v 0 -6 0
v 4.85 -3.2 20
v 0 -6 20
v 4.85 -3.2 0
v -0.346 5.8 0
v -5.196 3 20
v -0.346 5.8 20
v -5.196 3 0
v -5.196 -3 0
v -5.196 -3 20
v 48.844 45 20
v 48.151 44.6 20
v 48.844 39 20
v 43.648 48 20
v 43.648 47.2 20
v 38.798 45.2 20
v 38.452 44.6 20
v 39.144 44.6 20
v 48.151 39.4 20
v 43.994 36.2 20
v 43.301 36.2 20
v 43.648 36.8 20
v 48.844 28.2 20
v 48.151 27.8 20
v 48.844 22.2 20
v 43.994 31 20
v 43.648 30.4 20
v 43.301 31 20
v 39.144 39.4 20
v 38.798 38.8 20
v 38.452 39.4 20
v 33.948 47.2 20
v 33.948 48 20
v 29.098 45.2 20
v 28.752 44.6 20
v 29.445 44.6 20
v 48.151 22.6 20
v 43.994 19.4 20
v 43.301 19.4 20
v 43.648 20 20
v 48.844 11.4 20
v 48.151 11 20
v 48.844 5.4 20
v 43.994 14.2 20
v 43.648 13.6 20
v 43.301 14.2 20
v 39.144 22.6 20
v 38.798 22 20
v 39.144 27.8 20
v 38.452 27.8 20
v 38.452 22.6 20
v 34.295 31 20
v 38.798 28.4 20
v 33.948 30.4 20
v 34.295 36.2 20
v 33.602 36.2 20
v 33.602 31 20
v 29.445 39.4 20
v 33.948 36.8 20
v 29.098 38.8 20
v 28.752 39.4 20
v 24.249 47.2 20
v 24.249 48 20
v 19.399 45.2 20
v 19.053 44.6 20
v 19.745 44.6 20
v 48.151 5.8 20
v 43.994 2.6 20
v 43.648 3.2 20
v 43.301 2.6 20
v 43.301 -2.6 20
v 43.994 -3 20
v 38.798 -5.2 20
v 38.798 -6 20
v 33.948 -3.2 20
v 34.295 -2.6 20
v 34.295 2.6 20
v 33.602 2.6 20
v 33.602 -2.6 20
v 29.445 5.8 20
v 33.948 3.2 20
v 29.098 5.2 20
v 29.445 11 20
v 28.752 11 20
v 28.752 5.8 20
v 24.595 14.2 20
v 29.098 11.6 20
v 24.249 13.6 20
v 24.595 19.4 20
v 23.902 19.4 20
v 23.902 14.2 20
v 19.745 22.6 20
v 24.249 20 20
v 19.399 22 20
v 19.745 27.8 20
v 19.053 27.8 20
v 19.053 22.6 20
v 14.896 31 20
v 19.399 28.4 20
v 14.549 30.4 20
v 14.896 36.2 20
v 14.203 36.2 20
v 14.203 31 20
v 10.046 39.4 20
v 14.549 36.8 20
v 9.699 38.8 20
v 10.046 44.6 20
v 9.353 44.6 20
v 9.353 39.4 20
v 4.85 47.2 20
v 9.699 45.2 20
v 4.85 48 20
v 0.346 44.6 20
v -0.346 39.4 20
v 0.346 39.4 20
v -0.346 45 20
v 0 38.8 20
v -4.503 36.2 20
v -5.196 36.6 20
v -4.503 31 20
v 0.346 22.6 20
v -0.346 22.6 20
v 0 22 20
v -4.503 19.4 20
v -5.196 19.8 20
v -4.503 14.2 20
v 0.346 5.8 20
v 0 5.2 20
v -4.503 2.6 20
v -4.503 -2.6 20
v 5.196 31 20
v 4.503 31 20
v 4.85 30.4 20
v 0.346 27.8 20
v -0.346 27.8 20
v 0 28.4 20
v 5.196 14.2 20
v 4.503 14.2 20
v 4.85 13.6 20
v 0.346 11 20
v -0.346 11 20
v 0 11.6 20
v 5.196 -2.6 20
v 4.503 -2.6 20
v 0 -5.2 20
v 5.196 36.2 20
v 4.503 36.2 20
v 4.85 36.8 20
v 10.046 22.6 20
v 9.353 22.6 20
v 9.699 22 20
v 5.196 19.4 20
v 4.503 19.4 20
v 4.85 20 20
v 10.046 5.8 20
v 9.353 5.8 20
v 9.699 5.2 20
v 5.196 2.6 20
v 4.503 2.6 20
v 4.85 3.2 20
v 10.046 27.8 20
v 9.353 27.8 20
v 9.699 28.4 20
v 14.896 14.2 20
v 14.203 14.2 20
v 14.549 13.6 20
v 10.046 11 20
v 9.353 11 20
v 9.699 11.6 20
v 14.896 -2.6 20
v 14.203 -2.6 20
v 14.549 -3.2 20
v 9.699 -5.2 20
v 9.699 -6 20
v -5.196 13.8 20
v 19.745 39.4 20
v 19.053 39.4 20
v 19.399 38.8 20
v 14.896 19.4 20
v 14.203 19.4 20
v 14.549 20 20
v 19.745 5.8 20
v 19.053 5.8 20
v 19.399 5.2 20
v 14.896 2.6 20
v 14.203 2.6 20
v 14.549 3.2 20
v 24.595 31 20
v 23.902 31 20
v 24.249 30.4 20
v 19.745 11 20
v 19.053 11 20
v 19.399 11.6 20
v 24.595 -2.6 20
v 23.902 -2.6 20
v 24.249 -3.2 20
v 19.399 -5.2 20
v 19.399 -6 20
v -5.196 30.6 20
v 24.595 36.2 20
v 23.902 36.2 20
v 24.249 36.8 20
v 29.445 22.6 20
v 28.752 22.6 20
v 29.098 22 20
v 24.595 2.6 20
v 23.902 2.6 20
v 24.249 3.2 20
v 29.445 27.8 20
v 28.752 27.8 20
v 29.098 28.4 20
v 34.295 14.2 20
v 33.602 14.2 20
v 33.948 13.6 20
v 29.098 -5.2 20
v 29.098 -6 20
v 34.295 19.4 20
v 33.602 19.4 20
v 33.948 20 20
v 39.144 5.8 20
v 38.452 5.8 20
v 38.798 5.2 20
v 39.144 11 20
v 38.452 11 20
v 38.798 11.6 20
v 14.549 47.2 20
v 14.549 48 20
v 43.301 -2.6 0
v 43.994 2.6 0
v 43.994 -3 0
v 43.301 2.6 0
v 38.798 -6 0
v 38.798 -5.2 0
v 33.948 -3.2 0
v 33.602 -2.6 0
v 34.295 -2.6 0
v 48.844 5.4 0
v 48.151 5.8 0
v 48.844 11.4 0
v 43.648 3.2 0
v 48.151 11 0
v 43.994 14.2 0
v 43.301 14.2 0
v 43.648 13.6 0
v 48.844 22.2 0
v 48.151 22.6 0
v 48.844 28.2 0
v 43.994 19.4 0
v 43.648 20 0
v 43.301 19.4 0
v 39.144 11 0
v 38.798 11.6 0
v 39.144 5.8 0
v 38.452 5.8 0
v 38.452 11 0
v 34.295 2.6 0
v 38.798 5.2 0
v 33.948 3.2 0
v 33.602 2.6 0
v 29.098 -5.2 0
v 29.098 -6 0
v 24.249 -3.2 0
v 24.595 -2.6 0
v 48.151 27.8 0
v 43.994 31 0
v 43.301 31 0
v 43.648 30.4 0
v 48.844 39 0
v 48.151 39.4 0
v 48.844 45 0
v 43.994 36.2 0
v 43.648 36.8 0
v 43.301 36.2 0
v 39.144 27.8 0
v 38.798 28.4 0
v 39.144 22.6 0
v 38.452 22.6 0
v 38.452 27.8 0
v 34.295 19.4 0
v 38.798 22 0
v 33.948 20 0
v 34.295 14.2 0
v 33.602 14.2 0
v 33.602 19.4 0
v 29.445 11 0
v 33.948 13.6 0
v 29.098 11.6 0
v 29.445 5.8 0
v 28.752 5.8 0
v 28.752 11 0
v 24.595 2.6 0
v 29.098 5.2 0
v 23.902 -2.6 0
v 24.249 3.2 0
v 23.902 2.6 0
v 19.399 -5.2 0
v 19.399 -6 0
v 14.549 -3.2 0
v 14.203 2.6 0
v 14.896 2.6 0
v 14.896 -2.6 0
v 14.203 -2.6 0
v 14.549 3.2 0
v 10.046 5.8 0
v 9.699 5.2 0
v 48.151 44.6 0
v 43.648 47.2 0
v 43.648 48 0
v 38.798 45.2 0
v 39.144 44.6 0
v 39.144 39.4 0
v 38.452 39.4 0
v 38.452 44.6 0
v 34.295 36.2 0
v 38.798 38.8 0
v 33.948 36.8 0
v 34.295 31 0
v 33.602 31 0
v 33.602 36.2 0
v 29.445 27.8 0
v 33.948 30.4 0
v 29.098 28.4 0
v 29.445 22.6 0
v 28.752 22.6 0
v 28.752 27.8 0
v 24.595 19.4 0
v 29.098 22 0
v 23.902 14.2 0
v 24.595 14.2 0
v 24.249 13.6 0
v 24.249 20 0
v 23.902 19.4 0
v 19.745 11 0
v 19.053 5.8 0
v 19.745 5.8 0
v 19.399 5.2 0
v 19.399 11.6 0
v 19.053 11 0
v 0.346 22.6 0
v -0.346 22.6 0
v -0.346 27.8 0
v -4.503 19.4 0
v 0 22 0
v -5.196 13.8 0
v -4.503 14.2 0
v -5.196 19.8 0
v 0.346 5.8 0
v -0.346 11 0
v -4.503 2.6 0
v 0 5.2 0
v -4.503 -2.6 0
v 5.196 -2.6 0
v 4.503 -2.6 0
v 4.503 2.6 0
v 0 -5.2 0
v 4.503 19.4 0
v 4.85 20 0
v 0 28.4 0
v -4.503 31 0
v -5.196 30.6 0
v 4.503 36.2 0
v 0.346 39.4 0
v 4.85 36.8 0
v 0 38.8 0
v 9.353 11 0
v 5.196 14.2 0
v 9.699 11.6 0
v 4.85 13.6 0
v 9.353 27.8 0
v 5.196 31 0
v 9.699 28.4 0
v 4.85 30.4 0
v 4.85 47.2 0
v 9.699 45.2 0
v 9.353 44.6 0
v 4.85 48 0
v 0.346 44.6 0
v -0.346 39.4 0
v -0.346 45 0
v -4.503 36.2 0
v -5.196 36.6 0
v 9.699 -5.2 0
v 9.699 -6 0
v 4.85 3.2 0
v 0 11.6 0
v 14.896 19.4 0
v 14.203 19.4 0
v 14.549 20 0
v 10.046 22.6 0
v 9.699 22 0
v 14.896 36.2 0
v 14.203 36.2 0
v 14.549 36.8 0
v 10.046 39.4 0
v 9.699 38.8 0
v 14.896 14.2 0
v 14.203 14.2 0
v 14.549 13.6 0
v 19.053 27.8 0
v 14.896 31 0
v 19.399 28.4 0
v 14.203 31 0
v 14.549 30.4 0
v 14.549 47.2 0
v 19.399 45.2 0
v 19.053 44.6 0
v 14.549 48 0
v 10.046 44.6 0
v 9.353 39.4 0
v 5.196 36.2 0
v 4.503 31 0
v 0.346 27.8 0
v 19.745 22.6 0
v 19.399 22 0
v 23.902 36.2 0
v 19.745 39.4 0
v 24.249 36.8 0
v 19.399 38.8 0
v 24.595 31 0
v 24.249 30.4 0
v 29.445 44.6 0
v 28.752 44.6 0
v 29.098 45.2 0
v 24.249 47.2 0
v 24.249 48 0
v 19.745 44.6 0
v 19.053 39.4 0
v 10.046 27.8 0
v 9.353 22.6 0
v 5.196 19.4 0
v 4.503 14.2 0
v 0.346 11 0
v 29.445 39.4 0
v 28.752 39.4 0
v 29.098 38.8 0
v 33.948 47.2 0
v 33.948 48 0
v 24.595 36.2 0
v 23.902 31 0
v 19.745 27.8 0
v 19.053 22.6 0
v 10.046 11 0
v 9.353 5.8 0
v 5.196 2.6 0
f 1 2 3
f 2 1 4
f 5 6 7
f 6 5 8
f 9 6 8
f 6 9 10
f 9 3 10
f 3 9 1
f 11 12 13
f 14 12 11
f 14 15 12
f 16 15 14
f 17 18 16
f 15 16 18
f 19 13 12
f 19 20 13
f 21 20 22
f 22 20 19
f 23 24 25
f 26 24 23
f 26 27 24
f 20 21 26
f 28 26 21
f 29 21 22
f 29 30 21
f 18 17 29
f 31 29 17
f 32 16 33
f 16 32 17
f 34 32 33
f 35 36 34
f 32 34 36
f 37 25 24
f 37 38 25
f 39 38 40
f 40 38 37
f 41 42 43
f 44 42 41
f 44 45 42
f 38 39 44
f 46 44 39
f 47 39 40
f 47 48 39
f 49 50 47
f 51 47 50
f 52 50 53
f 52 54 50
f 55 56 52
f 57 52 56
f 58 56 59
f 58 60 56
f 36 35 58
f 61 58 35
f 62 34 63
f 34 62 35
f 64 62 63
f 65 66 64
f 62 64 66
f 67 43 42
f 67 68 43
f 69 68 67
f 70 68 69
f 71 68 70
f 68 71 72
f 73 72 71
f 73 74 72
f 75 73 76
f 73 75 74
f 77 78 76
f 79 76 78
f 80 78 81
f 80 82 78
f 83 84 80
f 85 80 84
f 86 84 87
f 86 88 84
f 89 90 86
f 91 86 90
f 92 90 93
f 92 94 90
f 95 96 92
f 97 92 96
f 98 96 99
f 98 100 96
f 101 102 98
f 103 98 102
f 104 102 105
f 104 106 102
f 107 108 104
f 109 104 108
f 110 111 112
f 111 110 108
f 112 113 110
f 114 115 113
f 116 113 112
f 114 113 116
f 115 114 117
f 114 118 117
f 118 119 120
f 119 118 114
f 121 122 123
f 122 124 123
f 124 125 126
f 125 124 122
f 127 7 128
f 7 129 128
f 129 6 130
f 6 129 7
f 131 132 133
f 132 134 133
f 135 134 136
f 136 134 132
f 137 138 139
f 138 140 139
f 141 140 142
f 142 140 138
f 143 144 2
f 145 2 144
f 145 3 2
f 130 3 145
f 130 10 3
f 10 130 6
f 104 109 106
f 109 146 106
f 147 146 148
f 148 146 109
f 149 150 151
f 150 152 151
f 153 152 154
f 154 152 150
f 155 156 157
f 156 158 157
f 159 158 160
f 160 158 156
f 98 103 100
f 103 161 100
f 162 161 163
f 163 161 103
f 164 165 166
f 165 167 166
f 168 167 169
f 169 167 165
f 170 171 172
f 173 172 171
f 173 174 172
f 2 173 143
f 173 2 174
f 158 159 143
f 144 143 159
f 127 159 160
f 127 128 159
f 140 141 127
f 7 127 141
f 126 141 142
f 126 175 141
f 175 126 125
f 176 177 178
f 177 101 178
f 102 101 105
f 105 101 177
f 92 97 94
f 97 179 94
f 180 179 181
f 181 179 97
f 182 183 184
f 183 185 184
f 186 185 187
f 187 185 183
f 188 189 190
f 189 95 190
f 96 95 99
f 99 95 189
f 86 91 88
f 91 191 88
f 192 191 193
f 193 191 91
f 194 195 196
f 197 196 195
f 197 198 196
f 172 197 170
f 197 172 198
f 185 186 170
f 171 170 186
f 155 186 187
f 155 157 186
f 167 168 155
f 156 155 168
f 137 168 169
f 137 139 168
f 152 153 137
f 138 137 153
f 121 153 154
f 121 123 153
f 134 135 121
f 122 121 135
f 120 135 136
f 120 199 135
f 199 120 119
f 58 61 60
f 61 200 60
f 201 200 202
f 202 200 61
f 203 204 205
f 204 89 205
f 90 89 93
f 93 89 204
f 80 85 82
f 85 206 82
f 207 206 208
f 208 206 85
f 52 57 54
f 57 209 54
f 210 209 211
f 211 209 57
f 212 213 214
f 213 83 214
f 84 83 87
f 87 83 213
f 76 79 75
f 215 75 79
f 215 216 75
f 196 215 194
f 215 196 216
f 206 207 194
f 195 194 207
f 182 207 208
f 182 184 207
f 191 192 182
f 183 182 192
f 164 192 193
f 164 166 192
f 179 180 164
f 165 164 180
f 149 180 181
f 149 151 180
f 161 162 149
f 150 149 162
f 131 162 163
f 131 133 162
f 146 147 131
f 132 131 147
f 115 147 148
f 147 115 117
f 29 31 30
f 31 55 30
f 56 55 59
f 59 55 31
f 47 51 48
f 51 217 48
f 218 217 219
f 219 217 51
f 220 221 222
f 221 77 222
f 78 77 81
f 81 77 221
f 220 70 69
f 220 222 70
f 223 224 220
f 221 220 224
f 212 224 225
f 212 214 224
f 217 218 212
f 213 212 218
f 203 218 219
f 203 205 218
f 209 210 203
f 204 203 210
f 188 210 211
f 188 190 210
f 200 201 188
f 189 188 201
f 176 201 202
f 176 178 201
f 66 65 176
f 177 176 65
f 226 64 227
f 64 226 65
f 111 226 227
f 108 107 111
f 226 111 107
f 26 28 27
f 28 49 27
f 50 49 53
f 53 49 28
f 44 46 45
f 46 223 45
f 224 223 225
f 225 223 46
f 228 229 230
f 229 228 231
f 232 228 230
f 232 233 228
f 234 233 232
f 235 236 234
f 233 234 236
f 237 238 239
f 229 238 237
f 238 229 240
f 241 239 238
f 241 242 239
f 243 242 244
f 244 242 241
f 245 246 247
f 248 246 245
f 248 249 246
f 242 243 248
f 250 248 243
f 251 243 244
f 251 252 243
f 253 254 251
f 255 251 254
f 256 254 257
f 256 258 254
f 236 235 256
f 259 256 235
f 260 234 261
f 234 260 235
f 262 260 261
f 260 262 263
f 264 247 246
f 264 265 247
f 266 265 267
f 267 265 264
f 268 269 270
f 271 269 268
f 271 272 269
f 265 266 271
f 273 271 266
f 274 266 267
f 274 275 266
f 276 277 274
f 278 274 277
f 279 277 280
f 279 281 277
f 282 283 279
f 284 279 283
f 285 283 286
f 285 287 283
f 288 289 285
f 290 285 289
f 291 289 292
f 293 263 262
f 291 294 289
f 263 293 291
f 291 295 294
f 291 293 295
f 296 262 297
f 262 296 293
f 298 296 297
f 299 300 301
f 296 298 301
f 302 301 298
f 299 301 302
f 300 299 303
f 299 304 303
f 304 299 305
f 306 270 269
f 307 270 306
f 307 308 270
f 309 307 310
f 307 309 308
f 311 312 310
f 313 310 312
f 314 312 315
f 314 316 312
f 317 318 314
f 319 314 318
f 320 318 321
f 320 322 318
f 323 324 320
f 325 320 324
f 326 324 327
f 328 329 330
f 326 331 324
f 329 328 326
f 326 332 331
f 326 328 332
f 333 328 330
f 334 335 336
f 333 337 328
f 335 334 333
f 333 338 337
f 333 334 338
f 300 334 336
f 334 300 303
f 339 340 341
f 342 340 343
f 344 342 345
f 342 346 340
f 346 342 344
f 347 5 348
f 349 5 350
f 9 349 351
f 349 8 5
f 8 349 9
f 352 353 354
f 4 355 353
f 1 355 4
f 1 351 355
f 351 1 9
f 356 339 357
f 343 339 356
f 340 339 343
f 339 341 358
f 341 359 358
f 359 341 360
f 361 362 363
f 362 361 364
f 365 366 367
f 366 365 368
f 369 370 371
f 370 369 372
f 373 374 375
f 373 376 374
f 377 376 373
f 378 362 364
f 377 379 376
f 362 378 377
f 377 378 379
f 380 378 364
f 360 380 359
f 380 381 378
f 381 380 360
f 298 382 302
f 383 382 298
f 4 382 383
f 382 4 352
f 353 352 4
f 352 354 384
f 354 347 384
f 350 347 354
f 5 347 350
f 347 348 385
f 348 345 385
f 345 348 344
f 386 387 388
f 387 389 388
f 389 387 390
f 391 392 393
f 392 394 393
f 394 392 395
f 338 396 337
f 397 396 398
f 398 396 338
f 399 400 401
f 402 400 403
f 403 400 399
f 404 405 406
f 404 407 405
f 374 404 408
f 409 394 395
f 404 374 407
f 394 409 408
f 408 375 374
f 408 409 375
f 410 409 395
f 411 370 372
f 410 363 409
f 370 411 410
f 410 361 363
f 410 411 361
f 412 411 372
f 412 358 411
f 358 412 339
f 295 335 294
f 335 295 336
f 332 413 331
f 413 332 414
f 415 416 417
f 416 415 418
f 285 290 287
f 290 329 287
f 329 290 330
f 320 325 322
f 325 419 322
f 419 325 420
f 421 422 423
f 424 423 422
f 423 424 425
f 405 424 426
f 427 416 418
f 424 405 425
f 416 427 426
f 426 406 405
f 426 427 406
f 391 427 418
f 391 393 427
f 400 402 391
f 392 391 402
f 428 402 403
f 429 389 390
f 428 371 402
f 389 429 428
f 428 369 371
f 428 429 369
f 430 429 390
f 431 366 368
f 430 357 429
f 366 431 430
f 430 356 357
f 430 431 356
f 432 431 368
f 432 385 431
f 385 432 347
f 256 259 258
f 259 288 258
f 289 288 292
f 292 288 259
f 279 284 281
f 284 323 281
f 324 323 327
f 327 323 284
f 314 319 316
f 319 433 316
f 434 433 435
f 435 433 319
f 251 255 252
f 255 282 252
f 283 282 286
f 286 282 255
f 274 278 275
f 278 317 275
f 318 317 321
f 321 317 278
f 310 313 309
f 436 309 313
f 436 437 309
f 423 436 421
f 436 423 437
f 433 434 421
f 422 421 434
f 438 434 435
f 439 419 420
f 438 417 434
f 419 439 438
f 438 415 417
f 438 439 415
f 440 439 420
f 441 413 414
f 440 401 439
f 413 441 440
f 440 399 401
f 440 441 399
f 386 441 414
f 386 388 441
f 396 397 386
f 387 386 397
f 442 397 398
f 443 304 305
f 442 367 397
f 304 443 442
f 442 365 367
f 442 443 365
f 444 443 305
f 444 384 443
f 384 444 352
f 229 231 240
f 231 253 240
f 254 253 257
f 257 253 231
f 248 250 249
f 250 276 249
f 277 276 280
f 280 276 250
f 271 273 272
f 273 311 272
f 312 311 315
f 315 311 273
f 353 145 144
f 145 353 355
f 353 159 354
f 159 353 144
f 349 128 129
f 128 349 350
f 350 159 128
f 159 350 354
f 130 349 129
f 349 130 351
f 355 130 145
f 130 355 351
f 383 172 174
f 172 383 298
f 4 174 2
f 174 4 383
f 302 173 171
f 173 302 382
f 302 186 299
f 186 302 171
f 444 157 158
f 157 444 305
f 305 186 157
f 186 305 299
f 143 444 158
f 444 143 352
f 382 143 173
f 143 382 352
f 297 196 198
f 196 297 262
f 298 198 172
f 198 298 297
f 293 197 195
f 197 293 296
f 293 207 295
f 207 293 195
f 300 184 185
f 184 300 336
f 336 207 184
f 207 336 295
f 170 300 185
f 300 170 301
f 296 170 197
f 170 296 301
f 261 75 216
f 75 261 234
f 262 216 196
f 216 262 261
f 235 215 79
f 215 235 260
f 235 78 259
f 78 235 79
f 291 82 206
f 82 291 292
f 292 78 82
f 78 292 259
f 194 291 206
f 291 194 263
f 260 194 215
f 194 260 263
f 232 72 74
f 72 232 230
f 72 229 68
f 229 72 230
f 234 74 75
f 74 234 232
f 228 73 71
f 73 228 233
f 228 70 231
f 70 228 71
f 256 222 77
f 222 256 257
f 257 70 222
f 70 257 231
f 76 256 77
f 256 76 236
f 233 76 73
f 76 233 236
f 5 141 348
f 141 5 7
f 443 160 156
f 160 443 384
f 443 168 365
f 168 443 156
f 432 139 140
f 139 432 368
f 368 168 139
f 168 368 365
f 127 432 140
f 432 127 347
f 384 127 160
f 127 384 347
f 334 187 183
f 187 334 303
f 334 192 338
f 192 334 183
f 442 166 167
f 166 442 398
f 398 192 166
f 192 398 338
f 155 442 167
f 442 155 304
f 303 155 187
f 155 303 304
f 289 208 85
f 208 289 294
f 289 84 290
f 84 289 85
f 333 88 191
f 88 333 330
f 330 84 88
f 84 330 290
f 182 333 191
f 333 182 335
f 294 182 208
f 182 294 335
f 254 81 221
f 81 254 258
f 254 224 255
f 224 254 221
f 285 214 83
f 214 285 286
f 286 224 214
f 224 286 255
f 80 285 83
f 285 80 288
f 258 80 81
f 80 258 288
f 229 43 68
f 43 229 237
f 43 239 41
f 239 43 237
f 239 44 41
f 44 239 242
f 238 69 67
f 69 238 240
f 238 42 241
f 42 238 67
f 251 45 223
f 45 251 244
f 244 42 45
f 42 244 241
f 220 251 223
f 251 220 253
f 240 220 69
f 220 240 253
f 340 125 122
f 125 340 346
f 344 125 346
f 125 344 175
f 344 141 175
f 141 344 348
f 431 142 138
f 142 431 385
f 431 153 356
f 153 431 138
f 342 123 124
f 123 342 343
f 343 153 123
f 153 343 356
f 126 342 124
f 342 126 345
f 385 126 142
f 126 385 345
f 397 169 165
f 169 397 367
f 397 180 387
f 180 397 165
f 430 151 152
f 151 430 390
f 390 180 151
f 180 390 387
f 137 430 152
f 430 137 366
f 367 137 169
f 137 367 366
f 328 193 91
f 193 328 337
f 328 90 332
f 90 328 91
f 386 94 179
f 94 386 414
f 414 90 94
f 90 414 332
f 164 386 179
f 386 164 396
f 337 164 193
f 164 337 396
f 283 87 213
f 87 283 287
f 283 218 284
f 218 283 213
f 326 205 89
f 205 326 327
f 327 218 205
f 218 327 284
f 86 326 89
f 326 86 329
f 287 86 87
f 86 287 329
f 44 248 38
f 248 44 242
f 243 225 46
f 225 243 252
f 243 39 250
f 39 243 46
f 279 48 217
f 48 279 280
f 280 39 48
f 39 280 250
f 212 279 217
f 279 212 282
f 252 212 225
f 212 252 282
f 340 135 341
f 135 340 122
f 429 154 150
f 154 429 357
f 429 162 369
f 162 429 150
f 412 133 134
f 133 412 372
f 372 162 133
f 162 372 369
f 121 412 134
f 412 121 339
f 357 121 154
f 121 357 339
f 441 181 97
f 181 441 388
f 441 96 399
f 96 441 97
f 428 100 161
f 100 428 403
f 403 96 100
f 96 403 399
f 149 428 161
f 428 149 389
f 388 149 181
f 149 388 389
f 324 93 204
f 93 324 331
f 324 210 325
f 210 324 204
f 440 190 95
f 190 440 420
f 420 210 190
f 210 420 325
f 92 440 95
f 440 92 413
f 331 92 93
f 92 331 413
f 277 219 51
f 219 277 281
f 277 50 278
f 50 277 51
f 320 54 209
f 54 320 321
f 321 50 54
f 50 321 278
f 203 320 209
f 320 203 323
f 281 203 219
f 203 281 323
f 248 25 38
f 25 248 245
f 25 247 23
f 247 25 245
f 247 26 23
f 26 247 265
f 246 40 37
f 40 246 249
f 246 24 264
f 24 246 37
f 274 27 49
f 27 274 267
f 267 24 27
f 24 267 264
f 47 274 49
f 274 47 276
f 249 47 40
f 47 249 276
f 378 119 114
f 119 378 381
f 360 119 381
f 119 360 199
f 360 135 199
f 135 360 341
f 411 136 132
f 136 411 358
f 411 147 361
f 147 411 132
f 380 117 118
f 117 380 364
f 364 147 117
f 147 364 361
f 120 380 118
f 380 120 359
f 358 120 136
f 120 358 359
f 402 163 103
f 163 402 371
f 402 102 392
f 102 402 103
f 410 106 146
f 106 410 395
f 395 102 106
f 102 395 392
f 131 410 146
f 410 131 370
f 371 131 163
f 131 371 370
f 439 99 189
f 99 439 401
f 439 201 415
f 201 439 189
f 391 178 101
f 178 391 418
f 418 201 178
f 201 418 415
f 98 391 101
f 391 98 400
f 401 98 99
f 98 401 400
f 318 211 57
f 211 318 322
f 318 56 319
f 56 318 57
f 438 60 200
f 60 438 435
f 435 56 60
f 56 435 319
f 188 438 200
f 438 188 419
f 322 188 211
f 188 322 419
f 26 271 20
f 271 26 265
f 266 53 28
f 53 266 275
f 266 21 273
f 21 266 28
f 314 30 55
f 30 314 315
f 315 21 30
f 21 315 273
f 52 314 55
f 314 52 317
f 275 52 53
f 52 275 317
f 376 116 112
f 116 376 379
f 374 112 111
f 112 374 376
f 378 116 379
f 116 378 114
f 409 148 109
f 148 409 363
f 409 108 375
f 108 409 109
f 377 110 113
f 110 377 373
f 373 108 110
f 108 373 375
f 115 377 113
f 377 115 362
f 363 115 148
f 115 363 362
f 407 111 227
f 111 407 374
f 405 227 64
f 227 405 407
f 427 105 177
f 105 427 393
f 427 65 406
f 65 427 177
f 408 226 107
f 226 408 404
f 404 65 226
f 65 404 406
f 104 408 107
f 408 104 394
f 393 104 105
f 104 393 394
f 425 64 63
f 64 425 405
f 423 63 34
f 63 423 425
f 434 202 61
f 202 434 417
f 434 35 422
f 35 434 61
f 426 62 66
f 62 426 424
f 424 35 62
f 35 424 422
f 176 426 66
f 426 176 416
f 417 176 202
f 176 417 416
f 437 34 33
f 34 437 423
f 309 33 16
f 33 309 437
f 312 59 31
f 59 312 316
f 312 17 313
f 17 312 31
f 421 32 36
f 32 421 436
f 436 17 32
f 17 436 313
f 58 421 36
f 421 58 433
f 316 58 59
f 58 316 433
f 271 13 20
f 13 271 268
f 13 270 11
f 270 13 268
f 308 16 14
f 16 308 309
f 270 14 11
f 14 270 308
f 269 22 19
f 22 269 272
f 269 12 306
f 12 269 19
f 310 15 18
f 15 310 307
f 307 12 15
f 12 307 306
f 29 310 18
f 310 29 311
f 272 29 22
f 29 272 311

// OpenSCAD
/* model honeycomb
Gian Pablo Villamil
October 2014

Customizable honeycomb generator. You can choose open or closed ended cells.
The overlap parameter controls the wall thickness of internal vs. external borders. If overlap is true, all walls will be same thickness. If overlap is false, then the
internal borders will be thicker and external thinner, so if you put two sections
together, they will mesh correctly.

 */

// Cell Radius mm
cellrad = 6; 
// Cell Depth mm
cellheight = 20; 
// Cell Wall Thickness mm
cellthick = 0.8; 

// Rows
rows = 6;
// Columns
cols = 5; 

// Open or closed cells?
celltype = "open"; // [open,closed]
// Inner and outer cell walls same thickness?
overlaptype = "yes"; // [yes,no]

closed = (celltype == "closed") ? true : false;
overlap = (overlaptype == "yes") ? true: false;

module flatcube(x,y,z) {
	translate([0,0,z/2]) cube([x,y,z],center=true);
}

module closedcell(radius,height,thickness) {
	difference() {
		cylinder(r=radius,h=height,$fn=6);
		for (i=[-1:1]) {
			translate([0,0,height]) rotate([0,-30,i*120]) flatcube(cellrad*3,cellrad*3,10);
		}
		translate([0,0,-1])
		difference() {
			cylinder(r=radius-thickness,h=height-thickness,$fn=6);
			for (i=[-1:1]) {
				translate([0,0,height-thickness]) rotate([0,-30,i*120]) flatcube(cellrad*3,cellrad*3,10);
			}
		}
	}
}

module opencell(radius,height,thickness) {
	difference() {
		cylinder(r=radius,h=height,$fn=6);
		translate([0,0,-0.5]) cylinder(r=radius-thickness,h=height+1,$fn=6);
	}
}


module honeycomb(rows,cols,closed) {
	cellsize = overlap ? cellrad-cellthick/2 : cellrad ;
	voff = cellsize*1.5;
	hoff = sqrt(pow(cellsize*2,2)-pow(cellsize,2));

	for (i=[0:rows-1]) {
		for (j=[0:cols-1]){
			translate([j*hoff+i%2*(hoff/2),i*voff,0])
			rotate([0,0,30]) 
			if (closed==true) {closedcell(cellrad,cellheight,cellthick);} 
				else
			{opencell(cellrad,cellheight,cellthick);} 
		}
	}
}


honeycomb(rows,cols,closed);

//opencell(cellrad,cellheight,cellthick);
//closedcell(cellrad,cellheight,cellthick);
